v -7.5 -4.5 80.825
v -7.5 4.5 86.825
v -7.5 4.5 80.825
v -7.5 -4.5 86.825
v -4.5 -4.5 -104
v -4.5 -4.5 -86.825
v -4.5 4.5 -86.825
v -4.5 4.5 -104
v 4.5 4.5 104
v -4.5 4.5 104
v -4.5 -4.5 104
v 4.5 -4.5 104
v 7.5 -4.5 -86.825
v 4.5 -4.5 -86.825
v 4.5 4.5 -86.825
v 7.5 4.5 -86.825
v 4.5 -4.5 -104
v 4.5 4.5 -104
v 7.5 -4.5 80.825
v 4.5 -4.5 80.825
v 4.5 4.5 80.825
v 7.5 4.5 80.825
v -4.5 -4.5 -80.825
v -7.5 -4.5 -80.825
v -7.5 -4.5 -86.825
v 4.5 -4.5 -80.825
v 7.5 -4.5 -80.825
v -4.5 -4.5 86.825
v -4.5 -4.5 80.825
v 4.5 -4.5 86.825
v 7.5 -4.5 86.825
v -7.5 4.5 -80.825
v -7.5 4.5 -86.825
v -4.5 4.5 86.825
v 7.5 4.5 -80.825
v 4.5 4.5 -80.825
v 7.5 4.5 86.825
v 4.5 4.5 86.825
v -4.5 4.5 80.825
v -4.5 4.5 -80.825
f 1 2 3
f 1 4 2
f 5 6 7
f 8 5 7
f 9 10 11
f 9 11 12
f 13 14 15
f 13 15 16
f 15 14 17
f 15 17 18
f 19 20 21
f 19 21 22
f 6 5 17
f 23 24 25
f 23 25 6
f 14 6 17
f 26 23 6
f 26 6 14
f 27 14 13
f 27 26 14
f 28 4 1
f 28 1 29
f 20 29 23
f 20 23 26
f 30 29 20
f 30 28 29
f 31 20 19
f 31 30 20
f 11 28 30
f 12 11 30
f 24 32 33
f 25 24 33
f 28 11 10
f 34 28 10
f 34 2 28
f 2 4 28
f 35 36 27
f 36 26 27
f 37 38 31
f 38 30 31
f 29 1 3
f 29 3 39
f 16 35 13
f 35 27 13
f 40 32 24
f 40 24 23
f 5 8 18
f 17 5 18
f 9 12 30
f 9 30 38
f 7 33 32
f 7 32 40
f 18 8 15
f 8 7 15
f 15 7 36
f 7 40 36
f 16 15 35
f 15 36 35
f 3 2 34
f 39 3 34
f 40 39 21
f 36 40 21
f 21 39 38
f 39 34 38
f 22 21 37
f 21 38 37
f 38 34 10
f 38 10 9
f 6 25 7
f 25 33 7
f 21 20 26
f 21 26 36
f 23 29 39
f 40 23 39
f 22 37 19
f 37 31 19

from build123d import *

# Parameters (mm, degrees)
SKETCH1_W           = 9
SKETCH1_H           = 9
BOSS_EXTRUDE1_DEPTH = 104
SKETCH2_W           = 3
SKETCH2_H           = 6
BOSS_EXTRUDE2_DEPTH = 4.5


with BuildPart() as part:
    # Sketch1 → Boss-Extrude1 (new body, symmetric)
    with BuildSketch(Plane.XY):
        Rectangle(SKETCH1_W, SKETCH1_H)
    extrude(amount=BOSS_EXTRUDE1_DEPTH, both=True)

    # Sketch2 → Boss-Extrude2 (add, symmetric)
    with BuildSketch(Plane(origin=(0, 0, 0), x_dir=(1, 0, 0), z_dir=(0, 1, 0))):
        with Locations((-6, -83.825)):
            Rectangle(SKETCH2_W, SKETCH2_H)
        with Locations((6, -83.825)):
            Rectangle(SKETCH2_W, SKETCH2_H)
        with Locations((6, 83.825)):
            Rectangle(SKETCH2_W, SKETCH2_H)
        with Locations((-6, 83.825)):
            Rectangle(SKETCH2_W, SKETCH2_H)
    extrude(amount=BOSS_EXTRUDE2_DEPTH, both=True)


solid = part.part
